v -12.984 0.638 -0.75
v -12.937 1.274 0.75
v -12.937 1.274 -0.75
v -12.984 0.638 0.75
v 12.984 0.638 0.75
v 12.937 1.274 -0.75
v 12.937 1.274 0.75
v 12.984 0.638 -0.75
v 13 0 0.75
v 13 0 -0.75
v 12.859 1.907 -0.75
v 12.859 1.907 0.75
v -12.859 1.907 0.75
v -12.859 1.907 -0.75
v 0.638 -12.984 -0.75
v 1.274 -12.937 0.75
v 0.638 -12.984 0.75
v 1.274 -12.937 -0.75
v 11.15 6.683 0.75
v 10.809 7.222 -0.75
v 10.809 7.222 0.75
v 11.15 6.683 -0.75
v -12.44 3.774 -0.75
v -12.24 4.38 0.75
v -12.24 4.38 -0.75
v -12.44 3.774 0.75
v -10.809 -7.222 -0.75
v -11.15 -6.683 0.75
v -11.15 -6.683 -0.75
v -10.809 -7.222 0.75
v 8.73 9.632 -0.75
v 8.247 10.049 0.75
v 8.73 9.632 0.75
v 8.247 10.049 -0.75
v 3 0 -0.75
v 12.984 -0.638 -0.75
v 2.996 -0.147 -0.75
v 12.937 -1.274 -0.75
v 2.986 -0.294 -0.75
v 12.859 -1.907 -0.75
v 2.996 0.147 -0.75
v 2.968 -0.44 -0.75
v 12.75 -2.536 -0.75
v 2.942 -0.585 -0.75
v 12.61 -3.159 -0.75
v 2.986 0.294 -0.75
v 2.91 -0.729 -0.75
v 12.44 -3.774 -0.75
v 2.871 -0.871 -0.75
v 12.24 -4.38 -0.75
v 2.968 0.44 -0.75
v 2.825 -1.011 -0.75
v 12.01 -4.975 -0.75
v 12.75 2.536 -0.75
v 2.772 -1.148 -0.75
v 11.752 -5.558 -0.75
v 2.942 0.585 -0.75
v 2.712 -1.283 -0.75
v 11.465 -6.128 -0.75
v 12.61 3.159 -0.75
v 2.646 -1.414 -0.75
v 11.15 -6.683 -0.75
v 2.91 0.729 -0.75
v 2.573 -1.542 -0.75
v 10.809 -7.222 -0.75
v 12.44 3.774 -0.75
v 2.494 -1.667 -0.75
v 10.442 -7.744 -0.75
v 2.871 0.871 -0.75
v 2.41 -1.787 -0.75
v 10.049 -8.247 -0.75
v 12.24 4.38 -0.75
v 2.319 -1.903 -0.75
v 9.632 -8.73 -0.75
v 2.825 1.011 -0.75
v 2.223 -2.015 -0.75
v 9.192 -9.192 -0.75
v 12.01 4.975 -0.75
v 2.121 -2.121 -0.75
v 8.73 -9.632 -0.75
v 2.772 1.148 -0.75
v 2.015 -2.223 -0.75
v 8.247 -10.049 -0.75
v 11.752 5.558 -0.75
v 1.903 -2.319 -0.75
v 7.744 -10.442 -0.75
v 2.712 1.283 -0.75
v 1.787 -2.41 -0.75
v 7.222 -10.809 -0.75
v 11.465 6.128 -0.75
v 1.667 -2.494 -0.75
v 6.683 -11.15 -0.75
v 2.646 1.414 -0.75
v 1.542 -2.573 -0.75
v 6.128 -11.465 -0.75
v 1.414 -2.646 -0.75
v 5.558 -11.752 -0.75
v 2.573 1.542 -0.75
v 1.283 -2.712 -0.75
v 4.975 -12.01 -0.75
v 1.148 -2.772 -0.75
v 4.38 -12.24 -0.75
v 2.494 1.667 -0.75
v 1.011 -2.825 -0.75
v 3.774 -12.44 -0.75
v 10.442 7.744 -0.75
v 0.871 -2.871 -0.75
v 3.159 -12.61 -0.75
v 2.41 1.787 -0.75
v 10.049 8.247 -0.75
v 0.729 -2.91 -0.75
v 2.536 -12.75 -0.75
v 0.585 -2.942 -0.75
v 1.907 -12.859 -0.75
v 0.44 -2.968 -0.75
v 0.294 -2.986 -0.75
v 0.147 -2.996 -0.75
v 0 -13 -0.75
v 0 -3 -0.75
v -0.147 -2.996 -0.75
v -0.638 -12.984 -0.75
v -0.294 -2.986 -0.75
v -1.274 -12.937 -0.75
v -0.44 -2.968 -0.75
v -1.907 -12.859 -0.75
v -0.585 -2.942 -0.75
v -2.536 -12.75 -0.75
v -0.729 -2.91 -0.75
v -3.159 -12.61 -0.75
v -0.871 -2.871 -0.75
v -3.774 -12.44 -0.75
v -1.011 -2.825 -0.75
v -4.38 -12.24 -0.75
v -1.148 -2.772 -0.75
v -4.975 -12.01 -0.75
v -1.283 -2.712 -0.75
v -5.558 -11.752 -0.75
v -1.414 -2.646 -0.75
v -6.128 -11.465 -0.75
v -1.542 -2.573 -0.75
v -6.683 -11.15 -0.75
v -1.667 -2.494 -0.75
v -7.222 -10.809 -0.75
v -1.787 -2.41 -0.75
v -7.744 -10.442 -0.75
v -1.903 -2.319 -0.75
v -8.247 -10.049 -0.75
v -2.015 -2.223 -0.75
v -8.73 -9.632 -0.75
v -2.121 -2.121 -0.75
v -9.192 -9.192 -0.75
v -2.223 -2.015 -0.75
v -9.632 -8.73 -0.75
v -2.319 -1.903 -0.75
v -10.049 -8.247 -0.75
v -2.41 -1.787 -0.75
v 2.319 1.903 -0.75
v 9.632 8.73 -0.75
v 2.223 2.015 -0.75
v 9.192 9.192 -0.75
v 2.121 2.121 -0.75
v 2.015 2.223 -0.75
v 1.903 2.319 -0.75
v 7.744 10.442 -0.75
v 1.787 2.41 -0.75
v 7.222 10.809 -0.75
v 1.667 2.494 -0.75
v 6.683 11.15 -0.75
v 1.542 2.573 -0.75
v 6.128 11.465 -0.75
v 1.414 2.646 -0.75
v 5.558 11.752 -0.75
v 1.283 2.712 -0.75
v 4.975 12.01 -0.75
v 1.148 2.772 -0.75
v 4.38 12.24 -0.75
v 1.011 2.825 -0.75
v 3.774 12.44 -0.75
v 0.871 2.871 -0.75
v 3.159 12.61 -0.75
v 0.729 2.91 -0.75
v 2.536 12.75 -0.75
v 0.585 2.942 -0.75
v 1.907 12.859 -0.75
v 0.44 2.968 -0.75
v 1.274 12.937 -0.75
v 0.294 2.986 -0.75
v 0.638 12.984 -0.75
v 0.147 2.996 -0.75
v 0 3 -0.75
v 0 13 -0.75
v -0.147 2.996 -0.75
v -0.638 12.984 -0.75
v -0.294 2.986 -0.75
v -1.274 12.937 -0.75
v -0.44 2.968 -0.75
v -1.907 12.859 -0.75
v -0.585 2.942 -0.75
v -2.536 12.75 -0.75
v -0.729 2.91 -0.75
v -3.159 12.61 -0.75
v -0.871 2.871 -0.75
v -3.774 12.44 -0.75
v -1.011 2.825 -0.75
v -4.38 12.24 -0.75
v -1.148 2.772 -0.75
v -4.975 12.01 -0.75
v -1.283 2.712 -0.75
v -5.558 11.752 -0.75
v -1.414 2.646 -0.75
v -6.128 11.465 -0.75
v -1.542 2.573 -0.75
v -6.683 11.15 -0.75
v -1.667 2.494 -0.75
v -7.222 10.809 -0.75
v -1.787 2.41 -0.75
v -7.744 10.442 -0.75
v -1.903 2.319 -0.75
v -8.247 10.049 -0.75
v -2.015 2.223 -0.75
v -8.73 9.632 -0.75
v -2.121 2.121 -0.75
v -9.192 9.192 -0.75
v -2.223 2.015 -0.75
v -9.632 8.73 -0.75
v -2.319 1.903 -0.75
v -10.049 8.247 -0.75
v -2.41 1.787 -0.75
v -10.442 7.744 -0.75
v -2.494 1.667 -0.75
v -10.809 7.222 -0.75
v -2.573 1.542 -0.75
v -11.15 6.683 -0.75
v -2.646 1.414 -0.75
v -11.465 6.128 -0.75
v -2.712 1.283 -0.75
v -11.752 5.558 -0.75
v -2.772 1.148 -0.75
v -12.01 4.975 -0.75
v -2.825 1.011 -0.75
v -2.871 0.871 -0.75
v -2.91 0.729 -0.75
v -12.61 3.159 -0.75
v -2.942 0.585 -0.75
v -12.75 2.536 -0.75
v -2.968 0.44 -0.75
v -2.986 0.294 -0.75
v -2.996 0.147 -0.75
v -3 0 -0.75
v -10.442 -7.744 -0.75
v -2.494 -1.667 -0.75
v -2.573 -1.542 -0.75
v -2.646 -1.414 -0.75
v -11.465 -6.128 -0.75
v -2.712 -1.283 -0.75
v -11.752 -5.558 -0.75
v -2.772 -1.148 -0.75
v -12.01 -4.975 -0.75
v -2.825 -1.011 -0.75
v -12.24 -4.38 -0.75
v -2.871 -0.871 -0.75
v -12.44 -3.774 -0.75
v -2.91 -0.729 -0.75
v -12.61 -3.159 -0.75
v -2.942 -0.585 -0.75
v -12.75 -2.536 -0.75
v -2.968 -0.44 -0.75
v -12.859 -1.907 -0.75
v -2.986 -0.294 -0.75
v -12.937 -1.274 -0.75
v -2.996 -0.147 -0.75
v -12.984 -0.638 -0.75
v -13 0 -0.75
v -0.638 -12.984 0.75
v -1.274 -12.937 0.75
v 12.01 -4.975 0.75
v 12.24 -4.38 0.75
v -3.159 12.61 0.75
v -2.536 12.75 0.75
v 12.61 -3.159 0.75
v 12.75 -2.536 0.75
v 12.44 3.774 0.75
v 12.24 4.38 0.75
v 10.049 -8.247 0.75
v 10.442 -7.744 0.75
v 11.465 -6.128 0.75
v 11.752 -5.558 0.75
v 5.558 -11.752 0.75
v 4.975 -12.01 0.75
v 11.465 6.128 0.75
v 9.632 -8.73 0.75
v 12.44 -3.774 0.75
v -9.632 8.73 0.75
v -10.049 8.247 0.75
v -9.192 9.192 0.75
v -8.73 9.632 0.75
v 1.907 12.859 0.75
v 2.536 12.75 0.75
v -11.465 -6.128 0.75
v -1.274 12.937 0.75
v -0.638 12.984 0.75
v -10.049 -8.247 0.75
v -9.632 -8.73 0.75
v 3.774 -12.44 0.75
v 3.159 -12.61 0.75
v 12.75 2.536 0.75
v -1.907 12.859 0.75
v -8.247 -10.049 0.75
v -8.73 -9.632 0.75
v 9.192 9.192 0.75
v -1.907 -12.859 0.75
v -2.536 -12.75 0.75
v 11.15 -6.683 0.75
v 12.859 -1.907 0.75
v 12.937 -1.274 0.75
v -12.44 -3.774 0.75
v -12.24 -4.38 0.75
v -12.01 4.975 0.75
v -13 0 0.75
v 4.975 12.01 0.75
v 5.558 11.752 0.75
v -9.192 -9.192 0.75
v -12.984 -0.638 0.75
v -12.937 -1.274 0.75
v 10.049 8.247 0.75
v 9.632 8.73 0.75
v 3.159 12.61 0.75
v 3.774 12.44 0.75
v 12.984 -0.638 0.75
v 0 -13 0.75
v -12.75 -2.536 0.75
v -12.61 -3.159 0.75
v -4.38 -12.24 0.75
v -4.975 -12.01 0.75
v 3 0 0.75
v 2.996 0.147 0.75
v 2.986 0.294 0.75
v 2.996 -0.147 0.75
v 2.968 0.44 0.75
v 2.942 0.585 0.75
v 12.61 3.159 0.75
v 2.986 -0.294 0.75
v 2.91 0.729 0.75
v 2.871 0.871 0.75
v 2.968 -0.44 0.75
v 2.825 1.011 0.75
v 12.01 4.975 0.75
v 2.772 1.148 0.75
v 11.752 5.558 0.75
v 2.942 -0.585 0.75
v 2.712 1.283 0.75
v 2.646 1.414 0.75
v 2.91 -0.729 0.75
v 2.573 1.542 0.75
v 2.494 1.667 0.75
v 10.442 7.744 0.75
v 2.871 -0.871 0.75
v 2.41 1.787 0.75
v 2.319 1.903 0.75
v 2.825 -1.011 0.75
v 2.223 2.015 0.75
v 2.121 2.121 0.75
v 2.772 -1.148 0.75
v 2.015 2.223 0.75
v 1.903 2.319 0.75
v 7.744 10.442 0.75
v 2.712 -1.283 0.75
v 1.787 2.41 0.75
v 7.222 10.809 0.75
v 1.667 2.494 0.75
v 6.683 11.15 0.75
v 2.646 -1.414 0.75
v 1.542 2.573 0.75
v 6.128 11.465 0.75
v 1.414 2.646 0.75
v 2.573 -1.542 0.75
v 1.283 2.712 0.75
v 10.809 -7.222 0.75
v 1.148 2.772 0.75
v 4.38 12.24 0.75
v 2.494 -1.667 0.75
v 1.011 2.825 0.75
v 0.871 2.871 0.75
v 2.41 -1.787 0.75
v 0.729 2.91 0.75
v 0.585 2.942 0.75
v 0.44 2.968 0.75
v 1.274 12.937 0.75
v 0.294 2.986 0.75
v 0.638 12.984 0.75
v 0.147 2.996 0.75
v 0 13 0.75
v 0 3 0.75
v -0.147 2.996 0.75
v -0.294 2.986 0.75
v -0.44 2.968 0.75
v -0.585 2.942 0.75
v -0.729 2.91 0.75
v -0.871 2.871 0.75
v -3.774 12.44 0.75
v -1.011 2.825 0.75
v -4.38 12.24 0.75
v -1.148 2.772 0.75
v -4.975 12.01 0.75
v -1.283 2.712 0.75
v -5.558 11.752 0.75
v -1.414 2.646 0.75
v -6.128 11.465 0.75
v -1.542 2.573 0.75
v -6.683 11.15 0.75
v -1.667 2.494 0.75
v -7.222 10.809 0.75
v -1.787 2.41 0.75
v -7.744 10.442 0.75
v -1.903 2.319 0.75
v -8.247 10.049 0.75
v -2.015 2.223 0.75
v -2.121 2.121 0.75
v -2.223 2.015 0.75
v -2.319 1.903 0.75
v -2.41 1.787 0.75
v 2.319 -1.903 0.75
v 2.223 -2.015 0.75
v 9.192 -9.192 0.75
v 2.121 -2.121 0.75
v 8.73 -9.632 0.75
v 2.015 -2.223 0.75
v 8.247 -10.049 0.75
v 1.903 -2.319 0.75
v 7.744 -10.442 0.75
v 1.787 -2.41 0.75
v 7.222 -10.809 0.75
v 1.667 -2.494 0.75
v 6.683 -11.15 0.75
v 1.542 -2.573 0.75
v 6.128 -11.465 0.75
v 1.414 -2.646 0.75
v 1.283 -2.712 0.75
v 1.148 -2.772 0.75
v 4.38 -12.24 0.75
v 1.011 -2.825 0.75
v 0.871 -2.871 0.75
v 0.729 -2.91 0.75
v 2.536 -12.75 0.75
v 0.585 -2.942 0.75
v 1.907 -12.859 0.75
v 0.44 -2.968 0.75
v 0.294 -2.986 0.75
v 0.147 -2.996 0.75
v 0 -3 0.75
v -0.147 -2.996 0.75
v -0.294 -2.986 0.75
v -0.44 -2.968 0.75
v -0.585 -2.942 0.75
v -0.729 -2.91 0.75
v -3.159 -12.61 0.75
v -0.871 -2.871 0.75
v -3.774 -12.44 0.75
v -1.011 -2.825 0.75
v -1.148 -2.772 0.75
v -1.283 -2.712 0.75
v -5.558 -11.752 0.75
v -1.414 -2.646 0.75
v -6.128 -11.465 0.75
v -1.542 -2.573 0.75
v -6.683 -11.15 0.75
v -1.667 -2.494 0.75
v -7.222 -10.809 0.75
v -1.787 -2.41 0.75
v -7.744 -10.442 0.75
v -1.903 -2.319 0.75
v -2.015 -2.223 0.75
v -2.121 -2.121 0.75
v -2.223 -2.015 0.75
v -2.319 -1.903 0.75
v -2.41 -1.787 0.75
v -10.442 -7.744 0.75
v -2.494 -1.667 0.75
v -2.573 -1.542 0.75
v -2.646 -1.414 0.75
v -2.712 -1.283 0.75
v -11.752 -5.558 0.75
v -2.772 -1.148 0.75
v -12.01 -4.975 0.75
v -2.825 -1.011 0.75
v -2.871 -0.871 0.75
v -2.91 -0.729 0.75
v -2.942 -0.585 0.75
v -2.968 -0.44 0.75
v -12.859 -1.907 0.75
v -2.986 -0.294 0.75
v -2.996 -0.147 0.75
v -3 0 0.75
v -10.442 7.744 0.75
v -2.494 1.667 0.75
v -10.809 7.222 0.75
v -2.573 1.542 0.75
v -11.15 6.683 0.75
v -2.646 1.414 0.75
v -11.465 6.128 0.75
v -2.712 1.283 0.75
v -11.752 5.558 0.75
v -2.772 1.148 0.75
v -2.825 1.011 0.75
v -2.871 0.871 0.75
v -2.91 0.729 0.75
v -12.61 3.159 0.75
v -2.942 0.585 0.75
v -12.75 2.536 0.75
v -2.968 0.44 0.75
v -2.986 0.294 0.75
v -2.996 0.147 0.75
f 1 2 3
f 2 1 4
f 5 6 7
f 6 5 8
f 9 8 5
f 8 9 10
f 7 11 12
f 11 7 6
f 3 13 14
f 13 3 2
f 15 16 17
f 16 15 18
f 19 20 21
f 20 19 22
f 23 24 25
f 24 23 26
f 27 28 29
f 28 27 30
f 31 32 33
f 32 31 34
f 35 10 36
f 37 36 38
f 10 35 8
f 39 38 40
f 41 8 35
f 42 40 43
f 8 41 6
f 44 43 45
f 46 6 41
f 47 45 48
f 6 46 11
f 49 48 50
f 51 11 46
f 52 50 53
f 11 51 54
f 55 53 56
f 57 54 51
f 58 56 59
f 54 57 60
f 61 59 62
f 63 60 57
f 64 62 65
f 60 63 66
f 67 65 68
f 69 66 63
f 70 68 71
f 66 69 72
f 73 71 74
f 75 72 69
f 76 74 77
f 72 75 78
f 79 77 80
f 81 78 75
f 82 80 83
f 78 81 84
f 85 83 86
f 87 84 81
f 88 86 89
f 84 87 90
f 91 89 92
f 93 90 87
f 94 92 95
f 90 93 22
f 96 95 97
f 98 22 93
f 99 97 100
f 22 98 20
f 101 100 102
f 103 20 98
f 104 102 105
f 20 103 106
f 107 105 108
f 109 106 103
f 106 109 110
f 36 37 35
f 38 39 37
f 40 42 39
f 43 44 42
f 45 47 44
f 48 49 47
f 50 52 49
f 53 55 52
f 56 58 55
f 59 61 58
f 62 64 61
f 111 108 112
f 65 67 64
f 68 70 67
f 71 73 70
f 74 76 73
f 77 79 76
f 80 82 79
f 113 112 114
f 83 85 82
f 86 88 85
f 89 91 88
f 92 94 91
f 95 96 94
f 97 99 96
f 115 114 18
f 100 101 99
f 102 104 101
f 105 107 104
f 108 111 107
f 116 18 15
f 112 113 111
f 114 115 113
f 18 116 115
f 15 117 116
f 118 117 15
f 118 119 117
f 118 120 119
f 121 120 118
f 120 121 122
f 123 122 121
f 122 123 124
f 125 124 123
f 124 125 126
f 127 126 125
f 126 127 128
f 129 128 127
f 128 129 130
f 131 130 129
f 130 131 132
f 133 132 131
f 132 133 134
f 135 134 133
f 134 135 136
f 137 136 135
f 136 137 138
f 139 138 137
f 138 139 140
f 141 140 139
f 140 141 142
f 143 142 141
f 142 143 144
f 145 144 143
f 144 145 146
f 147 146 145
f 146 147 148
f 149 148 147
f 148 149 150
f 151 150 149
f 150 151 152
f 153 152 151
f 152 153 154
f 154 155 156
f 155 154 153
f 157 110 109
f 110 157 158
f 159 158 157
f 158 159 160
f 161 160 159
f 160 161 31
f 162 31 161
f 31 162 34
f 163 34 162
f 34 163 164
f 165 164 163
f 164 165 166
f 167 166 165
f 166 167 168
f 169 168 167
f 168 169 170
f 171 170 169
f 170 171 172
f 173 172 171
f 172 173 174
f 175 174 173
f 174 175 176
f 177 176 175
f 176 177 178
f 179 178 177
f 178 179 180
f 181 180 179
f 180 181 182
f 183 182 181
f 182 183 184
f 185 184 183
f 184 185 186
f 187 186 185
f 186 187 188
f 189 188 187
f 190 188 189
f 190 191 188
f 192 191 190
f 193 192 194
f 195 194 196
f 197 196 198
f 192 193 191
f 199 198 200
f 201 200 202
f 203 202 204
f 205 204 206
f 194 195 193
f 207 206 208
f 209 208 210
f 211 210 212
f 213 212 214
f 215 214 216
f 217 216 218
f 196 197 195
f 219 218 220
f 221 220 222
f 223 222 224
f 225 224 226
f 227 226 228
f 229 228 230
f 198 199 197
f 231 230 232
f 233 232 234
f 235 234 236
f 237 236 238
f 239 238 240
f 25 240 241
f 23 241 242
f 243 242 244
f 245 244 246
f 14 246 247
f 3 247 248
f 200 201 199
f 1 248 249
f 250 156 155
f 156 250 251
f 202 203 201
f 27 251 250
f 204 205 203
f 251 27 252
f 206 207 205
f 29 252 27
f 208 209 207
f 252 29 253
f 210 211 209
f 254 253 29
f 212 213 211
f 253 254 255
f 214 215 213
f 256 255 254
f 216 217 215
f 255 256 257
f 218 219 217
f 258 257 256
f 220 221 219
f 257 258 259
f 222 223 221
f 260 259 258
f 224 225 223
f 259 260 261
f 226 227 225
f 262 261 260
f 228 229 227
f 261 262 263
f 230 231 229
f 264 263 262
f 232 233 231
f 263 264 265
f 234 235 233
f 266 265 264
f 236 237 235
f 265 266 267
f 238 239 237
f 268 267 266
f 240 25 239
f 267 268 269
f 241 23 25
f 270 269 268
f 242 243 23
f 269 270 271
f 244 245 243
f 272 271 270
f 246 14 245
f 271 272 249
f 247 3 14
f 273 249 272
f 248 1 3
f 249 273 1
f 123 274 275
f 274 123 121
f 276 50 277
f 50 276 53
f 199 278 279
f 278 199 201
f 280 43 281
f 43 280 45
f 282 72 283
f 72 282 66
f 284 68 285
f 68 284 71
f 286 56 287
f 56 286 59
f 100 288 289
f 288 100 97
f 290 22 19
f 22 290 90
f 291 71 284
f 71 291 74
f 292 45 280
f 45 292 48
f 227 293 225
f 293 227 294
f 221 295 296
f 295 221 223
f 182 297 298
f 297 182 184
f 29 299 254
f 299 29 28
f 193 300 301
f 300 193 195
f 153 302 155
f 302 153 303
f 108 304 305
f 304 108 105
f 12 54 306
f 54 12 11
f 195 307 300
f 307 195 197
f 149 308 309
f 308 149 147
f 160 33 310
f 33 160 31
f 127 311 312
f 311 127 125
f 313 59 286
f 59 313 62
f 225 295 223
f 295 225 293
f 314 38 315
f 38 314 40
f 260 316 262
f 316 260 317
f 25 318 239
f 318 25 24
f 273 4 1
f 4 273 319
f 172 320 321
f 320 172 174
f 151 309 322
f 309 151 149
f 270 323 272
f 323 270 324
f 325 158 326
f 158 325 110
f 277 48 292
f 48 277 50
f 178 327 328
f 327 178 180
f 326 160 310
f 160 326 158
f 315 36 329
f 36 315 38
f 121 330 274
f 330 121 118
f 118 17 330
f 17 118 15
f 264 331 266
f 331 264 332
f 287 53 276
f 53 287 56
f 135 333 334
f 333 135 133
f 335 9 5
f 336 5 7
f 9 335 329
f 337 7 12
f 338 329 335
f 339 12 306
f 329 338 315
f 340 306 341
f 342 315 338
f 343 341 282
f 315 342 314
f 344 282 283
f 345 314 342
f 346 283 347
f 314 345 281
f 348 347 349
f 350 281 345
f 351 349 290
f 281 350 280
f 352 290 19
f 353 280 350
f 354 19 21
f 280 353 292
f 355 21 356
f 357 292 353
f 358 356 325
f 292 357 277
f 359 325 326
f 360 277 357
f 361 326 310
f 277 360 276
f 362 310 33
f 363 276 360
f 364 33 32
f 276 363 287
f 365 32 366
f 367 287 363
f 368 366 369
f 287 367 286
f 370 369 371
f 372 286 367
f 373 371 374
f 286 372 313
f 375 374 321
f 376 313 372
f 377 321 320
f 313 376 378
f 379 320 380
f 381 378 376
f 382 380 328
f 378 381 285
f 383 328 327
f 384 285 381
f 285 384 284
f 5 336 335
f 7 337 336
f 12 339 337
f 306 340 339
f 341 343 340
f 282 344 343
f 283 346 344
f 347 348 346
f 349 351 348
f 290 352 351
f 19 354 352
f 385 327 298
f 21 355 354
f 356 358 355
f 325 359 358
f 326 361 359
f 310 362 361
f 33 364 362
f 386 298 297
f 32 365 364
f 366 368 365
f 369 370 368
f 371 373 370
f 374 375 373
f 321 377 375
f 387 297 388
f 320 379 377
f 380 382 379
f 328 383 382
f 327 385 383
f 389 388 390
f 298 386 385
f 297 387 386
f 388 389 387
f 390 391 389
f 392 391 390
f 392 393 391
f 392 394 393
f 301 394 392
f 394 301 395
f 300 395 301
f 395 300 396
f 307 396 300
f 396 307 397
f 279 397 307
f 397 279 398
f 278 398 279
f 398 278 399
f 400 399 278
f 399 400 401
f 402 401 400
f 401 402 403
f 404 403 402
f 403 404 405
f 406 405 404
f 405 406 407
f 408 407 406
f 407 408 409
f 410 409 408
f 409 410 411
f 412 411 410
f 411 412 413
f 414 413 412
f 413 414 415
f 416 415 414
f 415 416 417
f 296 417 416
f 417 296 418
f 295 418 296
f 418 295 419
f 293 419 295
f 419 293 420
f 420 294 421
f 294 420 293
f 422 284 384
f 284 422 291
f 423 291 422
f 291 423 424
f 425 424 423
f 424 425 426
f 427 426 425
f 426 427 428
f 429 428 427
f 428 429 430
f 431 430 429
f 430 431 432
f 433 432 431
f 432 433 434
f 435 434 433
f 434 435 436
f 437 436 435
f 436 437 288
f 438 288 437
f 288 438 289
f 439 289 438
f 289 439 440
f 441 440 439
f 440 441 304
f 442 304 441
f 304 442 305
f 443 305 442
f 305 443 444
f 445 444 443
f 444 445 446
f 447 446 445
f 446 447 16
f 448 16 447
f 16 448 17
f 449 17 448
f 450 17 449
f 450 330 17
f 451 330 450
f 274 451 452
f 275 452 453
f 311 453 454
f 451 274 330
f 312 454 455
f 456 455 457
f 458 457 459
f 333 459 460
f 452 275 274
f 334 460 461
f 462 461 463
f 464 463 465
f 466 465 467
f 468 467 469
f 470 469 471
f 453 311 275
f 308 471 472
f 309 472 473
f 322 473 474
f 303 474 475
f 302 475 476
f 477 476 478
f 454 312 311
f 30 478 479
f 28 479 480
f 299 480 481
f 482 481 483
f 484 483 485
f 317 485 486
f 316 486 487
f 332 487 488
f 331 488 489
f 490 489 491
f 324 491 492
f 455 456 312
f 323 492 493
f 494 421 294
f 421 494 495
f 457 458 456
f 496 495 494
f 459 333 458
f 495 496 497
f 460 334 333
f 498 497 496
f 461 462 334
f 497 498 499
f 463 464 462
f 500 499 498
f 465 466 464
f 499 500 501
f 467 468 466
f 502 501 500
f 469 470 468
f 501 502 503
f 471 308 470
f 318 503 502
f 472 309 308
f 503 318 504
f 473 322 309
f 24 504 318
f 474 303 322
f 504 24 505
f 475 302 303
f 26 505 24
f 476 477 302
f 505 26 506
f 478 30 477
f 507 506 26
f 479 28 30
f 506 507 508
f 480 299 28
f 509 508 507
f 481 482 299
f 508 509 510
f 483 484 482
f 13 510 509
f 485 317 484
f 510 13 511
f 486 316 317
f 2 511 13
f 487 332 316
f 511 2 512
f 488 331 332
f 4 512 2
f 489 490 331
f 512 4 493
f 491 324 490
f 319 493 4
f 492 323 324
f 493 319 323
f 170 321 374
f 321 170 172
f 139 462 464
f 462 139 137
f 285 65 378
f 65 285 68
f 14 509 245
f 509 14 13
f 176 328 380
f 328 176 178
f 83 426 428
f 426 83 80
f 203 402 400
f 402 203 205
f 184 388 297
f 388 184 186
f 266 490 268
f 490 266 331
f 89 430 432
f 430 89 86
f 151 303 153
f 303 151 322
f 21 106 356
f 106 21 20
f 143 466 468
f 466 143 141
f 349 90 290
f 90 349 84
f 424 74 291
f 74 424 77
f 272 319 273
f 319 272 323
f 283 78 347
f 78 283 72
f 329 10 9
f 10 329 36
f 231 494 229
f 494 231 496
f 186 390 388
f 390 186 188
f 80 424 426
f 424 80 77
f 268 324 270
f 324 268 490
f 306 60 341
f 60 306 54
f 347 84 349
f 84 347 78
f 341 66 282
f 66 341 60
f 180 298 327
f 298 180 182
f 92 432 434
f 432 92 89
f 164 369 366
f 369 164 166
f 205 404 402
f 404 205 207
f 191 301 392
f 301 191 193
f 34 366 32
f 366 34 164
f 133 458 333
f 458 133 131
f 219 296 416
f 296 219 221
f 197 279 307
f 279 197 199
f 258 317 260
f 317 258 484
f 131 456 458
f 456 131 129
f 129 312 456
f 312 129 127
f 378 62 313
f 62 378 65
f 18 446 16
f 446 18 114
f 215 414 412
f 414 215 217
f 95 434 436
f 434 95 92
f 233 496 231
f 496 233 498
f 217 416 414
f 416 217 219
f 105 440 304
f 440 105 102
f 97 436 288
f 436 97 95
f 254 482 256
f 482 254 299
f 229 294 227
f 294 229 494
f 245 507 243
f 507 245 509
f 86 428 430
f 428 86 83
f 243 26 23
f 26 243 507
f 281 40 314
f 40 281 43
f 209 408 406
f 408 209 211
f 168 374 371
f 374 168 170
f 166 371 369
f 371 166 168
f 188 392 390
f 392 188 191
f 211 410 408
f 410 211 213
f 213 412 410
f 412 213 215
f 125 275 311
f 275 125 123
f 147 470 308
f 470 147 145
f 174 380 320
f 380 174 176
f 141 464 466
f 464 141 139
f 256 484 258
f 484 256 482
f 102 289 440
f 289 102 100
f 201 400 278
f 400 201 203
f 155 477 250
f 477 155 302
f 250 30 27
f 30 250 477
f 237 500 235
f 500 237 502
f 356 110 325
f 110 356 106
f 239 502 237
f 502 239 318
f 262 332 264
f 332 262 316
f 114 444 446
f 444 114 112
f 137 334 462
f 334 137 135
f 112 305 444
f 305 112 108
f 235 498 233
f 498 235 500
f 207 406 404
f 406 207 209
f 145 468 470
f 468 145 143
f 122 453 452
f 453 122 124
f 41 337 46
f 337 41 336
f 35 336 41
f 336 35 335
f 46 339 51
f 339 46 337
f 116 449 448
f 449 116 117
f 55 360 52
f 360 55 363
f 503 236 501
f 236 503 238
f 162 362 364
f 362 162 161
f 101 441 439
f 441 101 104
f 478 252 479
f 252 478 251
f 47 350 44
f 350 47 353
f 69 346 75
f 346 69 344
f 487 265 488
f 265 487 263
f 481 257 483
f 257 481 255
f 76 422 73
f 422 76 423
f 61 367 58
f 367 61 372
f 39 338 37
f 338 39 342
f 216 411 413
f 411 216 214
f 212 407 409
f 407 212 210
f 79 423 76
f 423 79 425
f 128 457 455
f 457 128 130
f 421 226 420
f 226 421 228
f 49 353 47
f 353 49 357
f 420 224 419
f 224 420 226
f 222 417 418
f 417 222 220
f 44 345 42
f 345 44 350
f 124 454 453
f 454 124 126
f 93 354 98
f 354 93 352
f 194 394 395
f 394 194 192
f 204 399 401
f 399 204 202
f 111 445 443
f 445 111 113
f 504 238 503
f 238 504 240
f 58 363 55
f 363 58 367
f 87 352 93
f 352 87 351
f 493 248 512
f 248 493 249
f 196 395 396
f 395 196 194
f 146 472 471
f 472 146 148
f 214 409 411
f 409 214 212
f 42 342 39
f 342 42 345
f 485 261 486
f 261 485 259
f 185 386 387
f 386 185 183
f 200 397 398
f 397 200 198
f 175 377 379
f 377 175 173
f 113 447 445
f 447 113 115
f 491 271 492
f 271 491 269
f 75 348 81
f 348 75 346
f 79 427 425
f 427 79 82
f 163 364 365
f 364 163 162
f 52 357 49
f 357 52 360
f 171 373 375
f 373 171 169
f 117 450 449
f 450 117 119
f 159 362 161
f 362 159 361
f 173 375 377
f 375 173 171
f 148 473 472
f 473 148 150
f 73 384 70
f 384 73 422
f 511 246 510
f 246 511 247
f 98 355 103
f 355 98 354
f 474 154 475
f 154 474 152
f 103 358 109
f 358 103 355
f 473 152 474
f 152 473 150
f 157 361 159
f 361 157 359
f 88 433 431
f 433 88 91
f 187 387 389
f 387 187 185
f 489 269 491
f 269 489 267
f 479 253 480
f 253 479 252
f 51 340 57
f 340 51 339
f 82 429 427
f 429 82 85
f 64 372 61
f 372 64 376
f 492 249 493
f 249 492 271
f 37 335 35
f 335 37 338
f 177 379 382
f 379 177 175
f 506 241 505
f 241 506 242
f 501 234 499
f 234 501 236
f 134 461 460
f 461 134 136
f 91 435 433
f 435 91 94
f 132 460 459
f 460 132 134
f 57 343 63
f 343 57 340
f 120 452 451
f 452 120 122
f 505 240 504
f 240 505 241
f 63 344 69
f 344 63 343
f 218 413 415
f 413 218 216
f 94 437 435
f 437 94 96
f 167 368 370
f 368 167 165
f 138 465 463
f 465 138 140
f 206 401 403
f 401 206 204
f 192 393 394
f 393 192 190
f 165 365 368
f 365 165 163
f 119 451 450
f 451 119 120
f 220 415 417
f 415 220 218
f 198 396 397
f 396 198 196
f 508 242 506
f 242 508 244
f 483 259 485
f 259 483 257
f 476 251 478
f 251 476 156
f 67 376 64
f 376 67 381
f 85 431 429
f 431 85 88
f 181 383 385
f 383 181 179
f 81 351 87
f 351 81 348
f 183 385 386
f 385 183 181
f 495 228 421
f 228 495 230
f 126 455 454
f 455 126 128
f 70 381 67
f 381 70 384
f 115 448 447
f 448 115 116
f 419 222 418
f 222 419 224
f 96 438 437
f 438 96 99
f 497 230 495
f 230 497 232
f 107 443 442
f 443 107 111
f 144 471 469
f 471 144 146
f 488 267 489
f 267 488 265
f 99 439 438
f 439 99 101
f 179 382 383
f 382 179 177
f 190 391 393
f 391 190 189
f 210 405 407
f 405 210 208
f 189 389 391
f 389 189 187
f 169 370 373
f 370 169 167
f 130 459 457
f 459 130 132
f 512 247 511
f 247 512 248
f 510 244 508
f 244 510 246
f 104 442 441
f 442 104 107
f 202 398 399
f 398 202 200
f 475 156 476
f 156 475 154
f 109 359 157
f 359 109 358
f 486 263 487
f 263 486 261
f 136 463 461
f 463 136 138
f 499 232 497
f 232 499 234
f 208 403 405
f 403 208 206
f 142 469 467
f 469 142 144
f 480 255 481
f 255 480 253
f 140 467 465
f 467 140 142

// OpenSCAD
$fn=128;

module penny_washer(id=6.0, od=26.0, thickness=1.5) {
    difference() {
        cylinder(d=od, h=thickness, center=true);
        cylinder(d=id, h=thickness + 0.2, center=true);
    }
}

penny_washer();
